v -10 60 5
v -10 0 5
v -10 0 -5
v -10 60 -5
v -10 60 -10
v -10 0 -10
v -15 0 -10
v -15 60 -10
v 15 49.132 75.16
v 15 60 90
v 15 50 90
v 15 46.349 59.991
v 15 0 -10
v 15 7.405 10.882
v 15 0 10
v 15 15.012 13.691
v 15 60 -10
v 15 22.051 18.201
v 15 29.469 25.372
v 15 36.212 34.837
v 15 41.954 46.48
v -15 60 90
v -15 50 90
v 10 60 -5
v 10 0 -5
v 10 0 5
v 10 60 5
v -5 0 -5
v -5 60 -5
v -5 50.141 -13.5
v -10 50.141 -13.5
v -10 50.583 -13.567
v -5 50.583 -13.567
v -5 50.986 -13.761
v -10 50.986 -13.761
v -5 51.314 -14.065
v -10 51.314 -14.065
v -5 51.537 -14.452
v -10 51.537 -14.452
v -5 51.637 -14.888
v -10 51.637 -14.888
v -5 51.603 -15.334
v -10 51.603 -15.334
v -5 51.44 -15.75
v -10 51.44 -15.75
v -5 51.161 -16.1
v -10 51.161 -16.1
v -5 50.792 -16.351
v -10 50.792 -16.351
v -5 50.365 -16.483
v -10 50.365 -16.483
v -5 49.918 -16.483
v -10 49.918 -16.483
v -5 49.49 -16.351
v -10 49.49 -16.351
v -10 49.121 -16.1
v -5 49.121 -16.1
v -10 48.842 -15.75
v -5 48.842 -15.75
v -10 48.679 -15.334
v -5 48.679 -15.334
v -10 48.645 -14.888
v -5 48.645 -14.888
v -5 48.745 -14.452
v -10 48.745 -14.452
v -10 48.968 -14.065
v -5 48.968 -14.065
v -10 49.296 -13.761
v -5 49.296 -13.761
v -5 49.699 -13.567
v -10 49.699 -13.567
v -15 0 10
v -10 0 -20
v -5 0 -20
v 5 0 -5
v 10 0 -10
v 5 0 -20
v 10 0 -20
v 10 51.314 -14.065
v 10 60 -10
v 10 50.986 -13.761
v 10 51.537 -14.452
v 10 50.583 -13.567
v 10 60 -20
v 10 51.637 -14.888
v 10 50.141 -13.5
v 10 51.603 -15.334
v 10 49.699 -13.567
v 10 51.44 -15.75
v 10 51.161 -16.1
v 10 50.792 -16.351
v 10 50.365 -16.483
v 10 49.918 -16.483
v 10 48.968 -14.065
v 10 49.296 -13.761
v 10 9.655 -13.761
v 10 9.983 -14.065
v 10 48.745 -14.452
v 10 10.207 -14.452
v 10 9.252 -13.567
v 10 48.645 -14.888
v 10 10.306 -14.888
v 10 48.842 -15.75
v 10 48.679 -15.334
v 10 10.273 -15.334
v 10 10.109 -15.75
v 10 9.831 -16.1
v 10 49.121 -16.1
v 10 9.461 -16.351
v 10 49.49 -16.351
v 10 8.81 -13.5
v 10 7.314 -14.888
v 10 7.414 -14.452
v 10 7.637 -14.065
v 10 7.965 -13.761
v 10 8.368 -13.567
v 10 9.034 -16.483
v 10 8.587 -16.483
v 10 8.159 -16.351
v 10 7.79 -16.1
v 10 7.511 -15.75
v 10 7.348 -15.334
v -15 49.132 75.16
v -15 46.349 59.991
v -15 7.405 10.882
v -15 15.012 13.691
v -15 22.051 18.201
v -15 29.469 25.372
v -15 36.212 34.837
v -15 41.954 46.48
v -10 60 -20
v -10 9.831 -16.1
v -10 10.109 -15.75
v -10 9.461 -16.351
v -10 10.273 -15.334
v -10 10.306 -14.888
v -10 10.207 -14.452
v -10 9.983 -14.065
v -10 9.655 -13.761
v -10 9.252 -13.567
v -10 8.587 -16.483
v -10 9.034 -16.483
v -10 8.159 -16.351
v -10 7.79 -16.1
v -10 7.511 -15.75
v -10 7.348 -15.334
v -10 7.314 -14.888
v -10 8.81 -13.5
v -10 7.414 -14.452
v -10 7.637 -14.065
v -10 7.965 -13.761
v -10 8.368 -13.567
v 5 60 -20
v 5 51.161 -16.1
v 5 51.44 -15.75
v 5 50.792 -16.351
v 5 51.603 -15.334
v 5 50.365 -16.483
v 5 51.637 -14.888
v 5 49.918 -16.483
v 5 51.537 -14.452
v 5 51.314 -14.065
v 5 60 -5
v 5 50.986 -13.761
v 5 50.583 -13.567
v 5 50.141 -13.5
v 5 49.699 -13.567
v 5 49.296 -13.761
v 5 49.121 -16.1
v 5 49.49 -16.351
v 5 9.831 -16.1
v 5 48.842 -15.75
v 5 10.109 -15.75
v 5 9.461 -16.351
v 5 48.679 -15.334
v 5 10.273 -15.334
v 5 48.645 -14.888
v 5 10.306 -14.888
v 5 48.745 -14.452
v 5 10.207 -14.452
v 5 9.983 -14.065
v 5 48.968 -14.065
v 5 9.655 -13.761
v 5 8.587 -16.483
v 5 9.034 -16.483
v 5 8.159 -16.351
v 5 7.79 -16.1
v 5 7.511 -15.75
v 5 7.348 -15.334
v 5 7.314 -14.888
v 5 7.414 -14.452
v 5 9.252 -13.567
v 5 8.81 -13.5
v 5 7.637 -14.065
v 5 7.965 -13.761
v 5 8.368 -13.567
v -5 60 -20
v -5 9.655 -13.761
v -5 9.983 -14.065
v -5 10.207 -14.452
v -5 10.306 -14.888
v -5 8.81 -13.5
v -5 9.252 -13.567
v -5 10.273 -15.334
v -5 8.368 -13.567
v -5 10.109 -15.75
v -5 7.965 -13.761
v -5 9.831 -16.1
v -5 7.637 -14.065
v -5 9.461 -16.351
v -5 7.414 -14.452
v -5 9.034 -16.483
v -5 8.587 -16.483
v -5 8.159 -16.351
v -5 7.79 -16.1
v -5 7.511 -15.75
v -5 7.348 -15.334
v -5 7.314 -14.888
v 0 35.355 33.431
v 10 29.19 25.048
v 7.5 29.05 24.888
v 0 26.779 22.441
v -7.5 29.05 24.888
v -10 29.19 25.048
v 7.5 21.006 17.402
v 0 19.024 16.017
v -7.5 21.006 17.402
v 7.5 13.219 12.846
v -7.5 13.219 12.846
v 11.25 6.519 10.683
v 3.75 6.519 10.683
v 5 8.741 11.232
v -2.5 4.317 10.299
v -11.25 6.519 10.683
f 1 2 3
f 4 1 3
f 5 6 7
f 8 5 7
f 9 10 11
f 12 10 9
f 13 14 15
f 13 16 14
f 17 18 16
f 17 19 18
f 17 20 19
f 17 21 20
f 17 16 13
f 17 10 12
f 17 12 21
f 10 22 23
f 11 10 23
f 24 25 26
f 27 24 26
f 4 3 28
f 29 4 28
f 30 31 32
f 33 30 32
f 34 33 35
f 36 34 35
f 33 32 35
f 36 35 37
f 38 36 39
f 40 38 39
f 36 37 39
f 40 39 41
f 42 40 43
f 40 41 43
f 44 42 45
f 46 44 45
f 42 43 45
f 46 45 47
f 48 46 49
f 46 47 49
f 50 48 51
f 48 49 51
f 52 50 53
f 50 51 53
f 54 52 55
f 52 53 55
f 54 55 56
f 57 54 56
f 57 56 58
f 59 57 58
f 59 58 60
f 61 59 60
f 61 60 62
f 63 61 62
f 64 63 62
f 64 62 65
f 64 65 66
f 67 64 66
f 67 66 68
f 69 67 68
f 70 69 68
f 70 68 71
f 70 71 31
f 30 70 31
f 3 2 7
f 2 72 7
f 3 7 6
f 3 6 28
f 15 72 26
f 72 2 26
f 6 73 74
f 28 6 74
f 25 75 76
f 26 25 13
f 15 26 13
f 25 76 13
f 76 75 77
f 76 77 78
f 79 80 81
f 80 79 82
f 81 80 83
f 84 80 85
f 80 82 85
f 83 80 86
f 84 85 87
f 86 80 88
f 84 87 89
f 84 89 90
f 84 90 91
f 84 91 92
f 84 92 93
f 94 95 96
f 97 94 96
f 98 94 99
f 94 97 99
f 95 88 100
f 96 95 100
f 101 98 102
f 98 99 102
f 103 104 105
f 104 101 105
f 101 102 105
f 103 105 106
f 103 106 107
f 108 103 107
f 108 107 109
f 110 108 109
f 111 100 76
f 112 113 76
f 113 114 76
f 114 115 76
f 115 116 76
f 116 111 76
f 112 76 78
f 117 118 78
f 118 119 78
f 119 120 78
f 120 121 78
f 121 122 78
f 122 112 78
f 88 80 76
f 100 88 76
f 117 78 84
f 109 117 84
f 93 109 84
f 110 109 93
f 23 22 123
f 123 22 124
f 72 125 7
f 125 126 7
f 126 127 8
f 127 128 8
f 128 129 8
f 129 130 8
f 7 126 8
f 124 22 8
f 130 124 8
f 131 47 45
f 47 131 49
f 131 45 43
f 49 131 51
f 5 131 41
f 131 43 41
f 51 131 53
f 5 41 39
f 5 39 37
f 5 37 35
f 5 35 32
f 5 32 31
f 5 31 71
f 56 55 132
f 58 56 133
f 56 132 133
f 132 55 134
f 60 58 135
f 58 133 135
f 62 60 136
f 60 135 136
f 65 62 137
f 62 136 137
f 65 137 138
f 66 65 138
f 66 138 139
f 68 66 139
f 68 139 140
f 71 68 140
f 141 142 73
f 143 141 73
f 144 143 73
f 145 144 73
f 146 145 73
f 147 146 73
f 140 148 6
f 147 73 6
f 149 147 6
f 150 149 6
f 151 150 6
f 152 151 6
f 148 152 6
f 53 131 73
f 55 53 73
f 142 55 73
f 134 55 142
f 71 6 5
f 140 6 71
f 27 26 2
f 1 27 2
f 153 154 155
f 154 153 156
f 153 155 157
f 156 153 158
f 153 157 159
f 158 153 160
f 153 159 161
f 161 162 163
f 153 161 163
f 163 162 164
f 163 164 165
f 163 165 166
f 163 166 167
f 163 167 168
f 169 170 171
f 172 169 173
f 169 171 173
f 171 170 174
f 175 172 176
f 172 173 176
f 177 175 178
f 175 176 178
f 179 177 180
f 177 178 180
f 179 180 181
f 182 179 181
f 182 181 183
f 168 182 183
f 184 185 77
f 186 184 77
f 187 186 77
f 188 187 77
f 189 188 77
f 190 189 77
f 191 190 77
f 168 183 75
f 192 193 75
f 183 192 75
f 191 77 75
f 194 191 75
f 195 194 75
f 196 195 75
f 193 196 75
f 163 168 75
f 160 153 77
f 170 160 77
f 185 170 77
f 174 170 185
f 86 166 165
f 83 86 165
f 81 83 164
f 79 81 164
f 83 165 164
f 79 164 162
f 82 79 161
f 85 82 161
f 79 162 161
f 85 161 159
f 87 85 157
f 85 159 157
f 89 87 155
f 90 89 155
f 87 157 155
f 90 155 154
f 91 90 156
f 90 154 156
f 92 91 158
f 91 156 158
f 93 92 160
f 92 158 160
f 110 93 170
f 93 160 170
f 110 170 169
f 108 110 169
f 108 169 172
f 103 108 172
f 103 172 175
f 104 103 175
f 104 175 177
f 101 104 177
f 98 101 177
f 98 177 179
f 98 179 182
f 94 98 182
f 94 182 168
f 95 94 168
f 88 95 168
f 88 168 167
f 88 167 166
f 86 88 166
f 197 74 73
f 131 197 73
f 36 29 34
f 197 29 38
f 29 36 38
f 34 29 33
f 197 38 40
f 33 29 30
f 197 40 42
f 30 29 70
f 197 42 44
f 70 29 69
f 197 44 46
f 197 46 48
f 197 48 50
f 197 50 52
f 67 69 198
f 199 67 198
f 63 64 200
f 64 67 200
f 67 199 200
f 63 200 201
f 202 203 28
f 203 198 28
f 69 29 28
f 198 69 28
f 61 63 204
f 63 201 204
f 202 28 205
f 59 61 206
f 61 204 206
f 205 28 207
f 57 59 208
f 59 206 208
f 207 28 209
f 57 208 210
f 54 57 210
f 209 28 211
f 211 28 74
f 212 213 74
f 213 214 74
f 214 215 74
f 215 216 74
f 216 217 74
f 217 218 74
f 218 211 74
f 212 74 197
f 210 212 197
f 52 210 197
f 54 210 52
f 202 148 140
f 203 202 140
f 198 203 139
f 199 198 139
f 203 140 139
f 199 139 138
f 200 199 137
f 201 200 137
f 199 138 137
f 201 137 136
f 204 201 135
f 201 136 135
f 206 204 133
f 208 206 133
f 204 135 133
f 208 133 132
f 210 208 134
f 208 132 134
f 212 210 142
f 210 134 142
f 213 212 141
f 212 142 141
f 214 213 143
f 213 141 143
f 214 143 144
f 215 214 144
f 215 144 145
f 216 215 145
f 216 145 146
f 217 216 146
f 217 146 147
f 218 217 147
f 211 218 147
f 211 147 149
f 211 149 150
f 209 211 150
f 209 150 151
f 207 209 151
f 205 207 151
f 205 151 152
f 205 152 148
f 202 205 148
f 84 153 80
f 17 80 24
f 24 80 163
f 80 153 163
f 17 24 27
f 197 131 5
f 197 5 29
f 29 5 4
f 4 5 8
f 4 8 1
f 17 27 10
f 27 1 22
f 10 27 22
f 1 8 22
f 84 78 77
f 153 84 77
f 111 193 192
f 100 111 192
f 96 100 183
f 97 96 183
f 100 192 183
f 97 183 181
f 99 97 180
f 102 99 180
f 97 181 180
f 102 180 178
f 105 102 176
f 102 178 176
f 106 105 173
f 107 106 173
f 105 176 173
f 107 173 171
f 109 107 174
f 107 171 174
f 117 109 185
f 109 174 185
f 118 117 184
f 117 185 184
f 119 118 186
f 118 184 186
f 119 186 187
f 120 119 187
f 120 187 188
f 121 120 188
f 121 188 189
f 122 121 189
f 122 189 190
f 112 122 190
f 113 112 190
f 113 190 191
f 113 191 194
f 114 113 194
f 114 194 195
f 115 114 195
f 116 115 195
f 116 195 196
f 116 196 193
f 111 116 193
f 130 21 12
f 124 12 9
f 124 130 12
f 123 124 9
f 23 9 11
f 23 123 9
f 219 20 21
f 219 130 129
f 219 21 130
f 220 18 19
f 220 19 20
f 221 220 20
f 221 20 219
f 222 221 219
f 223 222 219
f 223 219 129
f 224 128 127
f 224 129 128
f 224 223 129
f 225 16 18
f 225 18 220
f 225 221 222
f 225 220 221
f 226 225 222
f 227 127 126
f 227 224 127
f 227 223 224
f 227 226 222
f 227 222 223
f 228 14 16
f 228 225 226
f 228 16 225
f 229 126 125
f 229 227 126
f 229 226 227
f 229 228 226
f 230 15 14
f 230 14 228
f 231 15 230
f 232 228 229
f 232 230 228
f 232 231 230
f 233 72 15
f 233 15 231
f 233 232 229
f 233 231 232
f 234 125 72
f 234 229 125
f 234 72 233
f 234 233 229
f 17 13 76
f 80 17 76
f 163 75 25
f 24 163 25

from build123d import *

# Parameters (mm, degrees)
MAKAS_BA_LANT_S_DEPTH    = 60
MOTOR_UZANT_S_DEPTH      = 15
MOTOR_UZANT_S_DEPTH_BACK = 15
IZIM3_R                  = 1.5
C_VATALAR_DEPTH          = 112.018016714


# Read off the part's stored shape, not the designer's step: makas bağlantısı
with BuildPart() as part:
    # makas bağlantısı outline → makas bağlantısı (new body)
    with BuildSketch(Plane(origin=(0, 0, 0), x_dir=(1, 0, 0), z_dir=(0, 1, 0))):
        Polygon((-5, 5), (-5, 20), (-10, 20), (-10, 10), (-15, 10), (-15, -10), (15, -10), (15, 10), (10, 10), (10, 20), (5, 20), (5, 5), (10, 5), (10, -5), (-10, -5), (-10, 5), align=None)
    extrude(amount=MAKAS_BA_LANT_S_DEPTH)

    # Çizim2 → motor uzantısı (add, two sides: drawn at the far end of the back side and taken through both)
    with BuildSketch(Plane(origin=(0, 0, 0), x_dir=(0, 0, -1), z_dir=(1, 0, 0)).offset(-MOTOR_UZANT_S_DEPTH_BACK)):
        with BuildLine():
            Line((-10, 60), (-90, 60))
            Line((-90, 60), (-90, 50))
            add(Edge.make_bspline(
                [(-10, 0), (-10, 50), (-90, 50)],
                knots=[0, 0, 0, 1.570796327, 1.570796327, 1.570796327], degree=2, weights=[1, 0.707106781, 1]))
            Line((-10, 0), (-10, 60))
        make_face()
    extrude(amount=MOTOR_UZANT_S_DEPTH + MOTOR_UZANT_S_DEPTH_BACK)

    # Çizim3 → cıvatalar (cut, through all)
    with BuildSketch(Plane.ZY.offset(10)):
        with Locations((-15, 50.141064744)):
            Circle(IZIM3_R)
        with Locations((-15, 8.810242757)):
            Circle(IZIM3_R)
    extrude(amount=-C_VATALAR_DEPTH, mode=Mode.SUBTRACT)


solid = part.part
